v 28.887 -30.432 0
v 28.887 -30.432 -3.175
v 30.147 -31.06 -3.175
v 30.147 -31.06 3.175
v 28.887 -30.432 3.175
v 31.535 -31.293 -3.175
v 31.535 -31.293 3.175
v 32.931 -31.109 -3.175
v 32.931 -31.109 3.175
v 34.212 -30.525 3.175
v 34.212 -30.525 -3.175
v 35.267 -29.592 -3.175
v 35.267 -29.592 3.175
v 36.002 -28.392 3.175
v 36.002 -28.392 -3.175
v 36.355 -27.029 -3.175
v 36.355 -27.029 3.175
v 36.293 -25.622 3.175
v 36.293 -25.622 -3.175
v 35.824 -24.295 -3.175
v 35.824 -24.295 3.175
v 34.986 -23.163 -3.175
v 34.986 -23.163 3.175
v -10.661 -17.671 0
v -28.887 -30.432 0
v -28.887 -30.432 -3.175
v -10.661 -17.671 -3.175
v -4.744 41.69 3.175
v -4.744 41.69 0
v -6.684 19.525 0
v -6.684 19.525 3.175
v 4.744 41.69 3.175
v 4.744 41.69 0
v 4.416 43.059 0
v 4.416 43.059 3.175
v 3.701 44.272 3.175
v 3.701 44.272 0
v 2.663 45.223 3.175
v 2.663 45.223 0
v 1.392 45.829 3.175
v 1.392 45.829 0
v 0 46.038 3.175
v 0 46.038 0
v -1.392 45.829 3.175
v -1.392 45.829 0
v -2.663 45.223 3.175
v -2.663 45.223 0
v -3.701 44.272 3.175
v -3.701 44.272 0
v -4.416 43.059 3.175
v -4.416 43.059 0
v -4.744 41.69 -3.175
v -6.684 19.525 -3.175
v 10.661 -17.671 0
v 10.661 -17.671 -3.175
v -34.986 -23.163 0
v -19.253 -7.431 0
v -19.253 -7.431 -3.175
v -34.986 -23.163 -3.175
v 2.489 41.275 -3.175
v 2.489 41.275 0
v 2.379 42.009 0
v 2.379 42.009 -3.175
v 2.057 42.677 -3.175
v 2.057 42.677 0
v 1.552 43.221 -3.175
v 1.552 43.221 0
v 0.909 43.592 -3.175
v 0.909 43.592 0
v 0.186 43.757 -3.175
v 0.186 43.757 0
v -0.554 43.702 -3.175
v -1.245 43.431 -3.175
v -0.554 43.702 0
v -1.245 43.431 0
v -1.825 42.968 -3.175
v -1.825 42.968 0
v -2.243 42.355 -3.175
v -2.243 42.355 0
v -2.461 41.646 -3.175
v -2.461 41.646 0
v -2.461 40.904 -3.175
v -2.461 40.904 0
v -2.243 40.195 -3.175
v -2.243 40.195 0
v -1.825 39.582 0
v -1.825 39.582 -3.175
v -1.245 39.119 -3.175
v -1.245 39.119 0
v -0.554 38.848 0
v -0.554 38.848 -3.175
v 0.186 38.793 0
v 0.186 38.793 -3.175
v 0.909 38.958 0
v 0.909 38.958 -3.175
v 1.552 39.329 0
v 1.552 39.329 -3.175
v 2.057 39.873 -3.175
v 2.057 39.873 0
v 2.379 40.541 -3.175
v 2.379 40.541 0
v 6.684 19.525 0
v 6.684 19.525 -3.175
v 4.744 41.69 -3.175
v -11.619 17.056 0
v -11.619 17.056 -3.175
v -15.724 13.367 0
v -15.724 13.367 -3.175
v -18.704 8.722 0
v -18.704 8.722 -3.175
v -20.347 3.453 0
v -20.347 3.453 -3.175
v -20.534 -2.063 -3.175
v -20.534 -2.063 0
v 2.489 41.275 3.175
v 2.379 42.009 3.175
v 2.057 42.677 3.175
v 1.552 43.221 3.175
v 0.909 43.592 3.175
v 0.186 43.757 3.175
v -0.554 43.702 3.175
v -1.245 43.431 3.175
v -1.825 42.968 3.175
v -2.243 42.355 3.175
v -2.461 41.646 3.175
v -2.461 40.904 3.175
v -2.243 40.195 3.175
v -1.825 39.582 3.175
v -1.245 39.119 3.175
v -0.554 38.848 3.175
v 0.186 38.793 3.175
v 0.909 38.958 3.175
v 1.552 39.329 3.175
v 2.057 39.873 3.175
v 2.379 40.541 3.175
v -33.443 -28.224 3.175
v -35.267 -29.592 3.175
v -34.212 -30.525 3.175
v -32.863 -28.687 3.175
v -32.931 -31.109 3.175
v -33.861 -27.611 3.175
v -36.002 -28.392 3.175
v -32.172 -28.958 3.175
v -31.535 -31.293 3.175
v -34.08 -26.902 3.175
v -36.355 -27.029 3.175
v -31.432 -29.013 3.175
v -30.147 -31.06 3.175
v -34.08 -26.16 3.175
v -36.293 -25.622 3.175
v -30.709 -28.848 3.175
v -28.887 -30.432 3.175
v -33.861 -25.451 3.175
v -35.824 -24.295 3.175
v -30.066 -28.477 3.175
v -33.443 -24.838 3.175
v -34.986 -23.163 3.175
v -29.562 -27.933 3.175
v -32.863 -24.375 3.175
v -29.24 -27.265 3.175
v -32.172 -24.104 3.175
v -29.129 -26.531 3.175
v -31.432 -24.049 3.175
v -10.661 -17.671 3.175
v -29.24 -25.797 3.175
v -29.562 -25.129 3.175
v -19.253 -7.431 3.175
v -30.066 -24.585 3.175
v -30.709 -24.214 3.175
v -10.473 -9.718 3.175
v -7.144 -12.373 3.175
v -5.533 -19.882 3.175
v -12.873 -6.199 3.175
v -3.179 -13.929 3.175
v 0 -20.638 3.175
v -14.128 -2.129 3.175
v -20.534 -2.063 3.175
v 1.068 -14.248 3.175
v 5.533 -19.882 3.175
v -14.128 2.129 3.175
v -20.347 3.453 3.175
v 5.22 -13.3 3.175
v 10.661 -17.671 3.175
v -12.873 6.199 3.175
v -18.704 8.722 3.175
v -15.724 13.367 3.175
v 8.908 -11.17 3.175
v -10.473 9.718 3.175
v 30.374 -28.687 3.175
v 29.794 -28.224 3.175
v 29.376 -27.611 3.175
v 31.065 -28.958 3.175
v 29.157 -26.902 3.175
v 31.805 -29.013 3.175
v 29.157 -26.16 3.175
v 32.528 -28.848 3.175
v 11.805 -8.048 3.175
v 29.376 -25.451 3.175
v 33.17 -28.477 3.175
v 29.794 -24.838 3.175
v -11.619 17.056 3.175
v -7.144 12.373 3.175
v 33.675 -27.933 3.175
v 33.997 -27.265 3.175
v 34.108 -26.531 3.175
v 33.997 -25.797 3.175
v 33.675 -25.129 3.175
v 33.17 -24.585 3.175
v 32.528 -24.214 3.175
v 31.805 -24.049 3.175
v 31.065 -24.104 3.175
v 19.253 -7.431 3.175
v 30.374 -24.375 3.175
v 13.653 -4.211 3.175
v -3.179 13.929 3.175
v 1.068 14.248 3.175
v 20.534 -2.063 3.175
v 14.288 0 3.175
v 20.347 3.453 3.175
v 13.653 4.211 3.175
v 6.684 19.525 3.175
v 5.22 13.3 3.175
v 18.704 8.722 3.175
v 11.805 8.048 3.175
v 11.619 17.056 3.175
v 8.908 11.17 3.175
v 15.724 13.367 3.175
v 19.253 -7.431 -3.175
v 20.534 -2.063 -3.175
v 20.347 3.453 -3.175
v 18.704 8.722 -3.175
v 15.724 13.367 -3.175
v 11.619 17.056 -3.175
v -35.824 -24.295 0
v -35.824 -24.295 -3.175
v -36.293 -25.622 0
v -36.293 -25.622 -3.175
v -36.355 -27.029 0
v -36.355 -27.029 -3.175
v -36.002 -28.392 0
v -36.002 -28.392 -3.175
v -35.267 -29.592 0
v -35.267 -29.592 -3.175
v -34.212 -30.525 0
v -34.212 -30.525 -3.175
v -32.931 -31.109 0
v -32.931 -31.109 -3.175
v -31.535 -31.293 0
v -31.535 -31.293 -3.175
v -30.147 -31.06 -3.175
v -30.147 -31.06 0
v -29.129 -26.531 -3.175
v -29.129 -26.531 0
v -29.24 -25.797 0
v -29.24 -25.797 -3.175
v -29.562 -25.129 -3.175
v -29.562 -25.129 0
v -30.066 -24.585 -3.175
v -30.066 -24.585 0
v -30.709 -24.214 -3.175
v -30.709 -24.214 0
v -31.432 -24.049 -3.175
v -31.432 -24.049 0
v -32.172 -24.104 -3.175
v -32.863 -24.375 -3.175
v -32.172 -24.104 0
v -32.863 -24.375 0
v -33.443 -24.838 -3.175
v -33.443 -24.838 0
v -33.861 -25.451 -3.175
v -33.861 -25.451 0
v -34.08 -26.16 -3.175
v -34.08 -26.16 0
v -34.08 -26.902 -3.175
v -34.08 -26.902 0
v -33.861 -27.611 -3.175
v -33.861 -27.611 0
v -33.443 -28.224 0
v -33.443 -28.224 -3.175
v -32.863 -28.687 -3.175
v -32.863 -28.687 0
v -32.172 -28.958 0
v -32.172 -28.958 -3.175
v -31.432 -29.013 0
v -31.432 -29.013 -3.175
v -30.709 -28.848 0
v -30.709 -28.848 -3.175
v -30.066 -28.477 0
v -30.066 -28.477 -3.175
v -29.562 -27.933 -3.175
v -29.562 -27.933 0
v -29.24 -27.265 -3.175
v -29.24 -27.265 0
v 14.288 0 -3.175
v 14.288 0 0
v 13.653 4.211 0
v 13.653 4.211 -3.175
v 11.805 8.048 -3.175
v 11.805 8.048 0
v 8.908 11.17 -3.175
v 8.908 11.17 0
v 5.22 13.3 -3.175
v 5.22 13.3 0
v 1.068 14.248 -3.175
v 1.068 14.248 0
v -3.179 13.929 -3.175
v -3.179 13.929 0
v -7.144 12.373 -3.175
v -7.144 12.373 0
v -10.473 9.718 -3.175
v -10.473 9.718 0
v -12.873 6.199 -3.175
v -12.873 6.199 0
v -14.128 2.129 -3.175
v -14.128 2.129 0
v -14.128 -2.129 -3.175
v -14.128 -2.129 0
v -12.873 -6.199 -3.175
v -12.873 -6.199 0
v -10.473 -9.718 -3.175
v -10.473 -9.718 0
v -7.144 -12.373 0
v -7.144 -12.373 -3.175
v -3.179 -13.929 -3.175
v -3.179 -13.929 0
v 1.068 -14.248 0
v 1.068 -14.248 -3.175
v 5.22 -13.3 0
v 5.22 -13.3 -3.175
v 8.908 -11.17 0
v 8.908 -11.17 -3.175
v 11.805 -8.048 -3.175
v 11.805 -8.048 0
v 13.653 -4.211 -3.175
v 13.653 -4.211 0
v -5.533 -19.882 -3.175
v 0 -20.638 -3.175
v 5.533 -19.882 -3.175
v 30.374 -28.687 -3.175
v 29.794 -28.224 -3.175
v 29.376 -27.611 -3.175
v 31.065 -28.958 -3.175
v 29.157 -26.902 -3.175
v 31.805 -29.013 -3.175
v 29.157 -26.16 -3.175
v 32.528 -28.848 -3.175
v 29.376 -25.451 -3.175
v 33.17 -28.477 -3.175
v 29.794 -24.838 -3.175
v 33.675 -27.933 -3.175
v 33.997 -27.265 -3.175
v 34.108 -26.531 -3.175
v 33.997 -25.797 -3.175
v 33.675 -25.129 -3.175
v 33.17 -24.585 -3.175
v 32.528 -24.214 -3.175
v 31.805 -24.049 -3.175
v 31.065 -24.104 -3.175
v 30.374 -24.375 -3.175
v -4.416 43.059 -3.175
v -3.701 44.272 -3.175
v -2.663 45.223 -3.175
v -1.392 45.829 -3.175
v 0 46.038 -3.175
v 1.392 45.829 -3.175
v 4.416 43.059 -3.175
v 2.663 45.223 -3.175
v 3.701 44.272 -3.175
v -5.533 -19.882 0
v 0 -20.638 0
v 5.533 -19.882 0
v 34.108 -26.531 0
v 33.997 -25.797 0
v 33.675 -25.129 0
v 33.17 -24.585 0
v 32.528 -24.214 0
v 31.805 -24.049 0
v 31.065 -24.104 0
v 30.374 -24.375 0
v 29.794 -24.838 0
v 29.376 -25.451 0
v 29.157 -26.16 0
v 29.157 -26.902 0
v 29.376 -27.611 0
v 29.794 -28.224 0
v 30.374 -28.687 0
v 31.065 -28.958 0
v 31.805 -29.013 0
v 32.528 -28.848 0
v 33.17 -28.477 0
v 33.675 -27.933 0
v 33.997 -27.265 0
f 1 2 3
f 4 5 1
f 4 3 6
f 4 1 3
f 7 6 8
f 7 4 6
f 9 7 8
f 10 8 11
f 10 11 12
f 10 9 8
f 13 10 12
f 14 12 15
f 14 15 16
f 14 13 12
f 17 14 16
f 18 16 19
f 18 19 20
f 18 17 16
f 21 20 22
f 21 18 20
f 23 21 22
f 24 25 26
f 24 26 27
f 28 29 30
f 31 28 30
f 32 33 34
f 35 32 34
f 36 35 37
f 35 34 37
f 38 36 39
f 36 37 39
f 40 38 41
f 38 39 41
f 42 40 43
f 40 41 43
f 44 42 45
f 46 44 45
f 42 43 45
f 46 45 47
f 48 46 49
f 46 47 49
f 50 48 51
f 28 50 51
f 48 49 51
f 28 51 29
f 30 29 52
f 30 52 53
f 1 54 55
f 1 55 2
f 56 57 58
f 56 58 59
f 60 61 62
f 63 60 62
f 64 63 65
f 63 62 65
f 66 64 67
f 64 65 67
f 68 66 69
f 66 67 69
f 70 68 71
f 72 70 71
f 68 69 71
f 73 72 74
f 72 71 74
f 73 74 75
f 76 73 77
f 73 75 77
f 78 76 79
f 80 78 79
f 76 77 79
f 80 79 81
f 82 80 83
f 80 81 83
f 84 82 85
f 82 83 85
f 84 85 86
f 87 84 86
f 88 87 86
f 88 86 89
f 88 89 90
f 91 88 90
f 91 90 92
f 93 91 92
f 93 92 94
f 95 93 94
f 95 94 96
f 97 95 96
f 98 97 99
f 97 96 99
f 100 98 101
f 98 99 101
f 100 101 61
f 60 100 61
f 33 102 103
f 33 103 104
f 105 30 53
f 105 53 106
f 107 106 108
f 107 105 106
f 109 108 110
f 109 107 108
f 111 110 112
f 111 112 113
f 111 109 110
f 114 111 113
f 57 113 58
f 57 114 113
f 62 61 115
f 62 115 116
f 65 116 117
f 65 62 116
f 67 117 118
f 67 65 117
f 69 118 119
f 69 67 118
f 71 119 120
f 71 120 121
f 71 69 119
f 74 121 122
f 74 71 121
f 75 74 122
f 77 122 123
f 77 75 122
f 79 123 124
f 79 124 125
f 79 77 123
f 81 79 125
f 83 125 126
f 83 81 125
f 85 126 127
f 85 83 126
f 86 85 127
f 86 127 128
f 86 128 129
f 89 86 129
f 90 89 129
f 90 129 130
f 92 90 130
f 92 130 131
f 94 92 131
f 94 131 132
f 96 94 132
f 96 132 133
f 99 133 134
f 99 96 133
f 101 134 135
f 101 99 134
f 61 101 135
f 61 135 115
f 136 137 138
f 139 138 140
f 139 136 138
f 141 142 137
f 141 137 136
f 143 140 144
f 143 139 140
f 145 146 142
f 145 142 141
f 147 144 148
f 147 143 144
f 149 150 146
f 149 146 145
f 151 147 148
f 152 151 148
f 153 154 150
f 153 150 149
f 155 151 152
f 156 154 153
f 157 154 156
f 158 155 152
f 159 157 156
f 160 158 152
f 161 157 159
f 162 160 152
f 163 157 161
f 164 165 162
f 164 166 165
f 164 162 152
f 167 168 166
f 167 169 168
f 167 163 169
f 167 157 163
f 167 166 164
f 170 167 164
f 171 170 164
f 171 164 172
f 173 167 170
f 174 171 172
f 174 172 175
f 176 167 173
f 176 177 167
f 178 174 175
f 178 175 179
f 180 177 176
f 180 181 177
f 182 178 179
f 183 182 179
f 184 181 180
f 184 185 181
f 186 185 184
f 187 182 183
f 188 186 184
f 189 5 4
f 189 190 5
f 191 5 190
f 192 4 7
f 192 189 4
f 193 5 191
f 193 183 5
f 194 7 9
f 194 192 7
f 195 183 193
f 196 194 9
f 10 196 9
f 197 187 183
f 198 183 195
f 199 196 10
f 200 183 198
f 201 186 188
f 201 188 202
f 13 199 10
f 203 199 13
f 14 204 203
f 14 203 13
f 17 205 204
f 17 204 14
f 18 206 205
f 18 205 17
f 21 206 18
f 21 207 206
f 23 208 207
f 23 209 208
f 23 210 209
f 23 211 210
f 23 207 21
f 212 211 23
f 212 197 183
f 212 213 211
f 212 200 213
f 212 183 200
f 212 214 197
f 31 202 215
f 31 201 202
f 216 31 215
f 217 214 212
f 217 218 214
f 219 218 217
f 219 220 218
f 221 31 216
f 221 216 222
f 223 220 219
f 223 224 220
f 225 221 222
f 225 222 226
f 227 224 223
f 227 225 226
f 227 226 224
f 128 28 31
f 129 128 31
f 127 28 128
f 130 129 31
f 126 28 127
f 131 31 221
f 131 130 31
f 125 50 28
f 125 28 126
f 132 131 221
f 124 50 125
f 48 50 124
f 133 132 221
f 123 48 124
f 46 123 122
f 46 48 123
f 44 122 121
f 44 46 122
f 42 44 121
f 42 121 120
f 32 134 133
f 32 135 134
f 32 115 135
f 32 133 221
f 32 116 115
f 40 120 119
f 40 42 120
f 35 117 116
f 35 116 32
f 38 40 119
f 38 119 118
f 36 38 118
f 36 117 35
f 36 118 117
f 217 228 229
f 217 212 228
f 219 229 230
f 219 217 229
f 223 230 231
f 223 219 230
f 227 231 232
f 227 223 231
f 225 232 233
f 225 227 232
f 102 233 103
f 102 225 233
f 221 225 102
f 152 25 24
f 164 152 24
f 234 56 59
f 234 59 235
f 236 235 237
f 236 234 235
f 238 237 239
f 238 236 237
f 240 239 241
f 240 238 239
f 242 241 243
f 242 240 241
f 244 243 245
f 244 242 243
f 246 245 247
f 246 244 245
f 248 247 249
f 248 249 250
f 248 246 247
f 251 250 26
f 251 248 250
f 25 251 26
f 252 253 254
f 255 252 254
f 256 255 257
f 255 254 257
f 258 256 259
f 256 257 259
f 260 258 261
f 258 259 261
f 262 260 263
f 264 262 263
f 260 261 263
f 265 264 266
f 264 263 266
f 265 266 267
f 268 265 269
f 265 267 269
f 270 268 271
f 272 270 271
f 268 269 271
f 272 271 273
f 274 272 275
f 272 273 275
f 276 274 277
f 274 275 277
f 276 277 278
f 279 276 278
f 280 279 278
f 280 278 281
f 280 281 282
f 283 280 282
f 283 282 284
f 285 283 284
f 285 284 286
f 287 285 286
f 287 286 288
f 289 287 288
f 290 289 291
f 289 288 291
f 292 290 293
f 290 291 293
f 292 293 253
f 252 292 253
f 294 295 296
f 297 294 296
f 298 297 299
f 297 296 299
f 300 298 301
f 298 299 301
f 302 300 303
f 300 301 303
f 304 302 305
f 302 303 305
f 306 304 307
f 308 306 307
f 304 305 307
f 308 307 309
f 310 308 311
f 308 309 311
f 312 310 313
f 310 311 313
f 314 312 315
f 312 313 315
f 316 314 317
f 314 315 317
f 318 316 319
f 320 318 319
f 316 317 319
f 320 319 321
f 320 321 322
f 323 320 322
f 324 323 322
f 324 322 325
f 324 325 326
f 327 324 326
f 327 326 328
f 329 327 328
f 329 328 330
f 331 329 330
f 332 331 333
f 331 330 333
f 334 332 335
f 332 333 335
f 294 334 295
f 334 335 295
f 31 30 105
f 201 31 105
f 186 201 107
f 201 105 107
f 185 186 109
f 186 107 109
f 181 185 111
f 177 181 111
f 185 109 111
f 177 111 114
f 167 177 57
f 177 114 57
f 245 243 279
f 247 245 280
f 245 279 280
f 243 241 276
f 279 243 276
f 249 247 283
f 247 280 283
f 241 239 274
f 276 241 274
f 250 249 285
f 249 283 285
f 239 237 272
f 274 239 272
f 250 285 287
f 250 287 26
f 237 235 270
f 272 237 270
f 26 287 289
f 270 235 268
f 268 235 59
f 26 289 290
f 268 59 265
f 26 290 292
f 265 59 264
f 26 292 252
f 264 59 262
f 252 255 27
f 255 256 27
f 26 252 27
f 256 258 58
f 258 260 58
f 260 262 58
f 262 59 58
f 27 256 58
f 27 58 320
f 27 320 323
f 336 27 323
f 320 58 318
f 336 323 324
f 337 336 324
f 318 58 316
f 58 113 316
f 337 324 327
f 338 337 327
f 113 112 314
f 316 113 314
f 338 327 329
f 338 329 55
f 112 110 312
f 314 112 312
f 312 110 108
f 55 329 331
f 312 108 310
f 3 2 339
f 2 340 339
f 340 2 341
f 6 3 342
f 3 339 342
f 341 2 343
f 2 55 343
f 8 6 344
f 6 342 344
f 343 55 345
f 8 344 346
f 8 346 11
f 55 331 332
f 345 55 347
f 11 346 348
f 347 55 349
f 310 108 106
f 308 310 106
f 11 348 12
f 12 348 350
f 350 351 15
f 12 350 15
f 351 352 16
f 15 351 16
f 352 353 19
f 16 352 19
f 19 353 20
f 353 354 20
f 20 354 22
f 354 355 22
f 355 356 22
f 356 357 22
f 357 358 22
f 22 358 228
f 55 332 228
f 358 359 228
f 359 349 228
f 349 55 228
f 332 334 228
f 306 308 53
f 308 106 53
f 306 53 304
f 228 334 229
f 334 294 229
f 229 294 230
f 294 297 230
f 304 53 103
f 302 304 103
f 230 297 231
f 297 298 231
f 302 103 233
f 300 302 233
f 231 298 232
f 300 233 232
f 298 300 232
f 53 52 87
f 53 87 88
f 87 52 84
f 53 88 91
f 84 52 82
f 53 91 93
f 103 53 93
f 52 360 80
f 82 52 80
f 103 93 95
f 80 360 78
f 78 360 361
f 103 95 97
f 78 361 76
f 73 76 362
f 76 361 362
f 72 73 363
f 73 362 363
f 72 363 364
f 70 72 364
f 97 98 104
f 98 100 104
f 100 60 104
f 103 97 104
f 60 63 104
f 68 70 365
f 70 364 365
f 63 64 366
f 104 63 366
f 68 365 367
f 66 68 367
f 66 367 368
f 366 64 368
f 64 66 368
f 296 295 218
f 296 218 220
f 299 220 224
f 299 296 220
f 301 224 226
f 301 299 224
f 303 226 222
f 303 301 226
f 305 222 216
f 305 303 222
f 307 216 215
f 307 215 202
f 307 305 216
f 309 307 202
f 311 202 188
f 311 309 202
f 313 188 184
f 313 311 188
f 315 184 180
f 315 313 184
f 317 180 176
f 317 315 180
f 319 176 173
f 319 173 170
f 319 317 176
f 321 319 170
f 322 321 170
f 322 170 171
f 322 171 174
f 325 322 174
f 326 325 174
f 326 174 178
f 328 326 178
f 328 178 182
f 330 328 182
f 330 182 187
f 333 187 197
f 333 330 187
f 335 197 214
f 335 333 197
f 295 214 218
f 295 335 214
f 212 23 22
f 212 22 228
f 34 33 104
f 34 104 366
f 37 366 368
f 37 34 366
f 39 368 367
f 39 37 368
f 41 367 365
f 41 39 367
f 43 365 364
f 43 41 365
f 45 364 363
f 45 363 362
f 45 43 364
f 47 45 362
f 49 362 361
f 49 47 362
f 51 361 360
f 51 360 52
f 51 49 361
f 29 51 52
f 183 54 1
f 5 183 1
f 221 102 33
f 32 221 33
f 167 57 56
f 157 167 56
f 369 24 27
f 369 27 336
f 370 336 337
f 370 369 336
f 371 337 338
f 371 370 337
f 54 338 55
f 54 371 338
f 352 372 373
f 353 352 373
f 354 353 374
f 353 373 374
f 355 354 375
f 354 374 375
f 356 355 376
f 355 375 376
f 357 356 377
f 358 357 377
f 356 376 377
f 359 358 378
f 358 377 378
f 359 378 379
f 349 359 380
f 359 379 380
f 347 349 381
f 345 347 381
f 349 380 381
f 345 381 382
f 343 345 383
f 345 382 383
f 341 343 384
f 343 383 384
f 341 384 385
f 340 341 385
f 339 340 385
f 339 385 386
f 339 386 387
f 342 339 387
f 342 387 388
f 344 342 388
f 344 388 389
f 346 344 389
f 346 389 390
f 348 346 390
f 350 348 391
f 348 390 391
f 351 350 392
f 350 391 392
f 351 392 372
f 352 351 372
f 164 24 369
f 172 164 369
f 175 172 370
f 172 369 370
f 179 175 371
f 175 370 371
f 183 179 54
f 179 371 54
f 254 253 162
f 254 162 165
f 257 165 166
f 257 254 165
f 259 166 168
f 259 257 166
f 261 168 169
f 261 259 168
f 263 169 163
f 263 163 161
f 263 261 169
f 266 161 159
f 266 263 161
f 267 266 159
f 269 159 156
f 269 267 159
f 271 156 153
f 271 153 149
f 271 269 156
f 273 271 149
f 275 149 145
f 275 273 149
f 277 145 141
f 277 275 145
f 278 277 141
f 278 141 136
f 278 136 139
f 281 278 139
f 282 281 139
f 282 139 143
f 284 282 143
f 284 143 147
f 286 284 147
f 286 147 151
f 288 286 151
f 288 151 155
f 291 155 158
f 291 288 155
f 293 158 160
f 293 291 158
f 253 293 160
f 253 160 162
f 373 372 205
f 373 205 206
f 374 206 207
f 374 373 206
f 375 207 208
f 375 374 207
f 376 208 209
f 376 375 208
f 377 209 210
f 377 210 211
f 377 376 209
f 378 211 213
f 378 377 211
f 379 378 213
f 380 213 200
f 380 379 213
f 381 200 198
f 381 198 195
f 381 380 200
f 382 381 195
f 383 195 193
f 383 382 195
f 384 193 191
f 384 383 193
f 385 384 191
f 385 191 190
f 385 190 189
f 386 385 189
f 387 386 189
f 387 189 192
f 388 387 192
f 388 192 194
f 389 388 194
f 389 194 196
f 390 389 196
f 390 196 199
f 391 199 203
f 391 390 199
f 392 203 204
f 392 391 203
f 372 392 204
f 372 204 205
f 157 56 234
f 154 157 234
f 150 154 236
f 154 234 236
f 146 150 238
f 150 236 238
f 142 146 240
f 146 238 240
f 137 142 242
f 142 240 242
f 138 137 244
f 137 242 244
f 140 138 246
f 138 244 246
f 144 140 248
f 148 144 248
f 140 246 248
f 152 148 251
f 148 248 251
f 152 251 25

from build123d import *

# Parameters (mm, degrees)
SKETCH1_R           = 20.6375
SKETCH1_R_2         = 14.2875
SKETCH1_R_3         = 4.7625
SKETCH1_R_4         = 2.4892
BOSS_EXTRUDE1_DEPTH = 3.175


with BuildPart() as part:
    # Sketch1 → Boss-Extrude1 (new, symmetric)
    # profile 1 of 7: a face of its own
    with BuildSketch(Plane.XY):
        Circle(SKETCH1_R)
        Circle(SKETCH1_R_2, mode=Mode.SUBTRACT)
    # profile 2 of 7: a face of its own
    with BuildSketch(Plane.XY):
        with BuildLine():
            ThreePointArc((4.7625, 41.275), (-0.207737332, 36.517032845), (-4.74437725, 41.690079225))
            Line((-4.74437725, 41.690079225), (-6.68354577, 19.525281616))
            ThreePointArc((-6.68354577, 19.525281616), (0, 20.6375), (6.68354577, 19.525281616))
            Line((6.68354577, 19.525281616), (4.74437725, 41.690079225))
            ThreePointArc((4.74437725, 41.690079225), (4.757967155, 41.482737332), (4.7625, 41.275))
        make_face()
    # profile 3 of 7: a face of its own
    with BuildSketch(Plane.XY):
        with BuildLine():
            Line((34.986080435, -23.163462544), (19.253333892, -7.430716001))
            ThreePointArc((19.253333892, -7.430716001), (15.809242195, -13.265529295), (10.661133073, -17.670502196))
            Line((10.661133073, -17.670502196), (28.886826612, -30.432270201))
            ThreePointArc((28.886826612, -30.432270201), (27.970197729, -23.469782599), (34.986080435, -23.163462544))
        make_face()
    # profile 4 of 7: a face of its own
    with BuildSketch(Plane.XY):
        with BuildLine():
            ThreePointArc((-10.661133073, -17.670502196), (-15.809242195, -13.265529295), (-19.253333892, -7.430716001))
            Line((-19.253333892, -7.430716001), (-34.986080435, -23.163462544))
            ThreePointArc((-34.986080435, -23.163462544), (-29.795954543, -22.131082316), (-26.85598439, -26.53105859))
            ThreePointArc((-26.85598439, -26.53105859), (-27.394095297, -28.73013636), (-28.886826612, -30.432270201))
            Line((-28.886826612, -30.432270201), (-10.661133073, -17.670502196))
        make_face()
    # profile 5 of 7: a face of its own
    with BuildSketch(Plane.XY):
        with Locations((-31.61848439, -26.53105859)):
            Circle(SKETCH1_R_3)
        with Locations((-31.61848439, -26.53105859)):
            Circle(SKETCH1_R_4, mode=Mode.SUBTRACT)
    # profile 6 of 7: a face of its own
    with BuildSketch(Plane.XY):
        with Locations((0, 41.275)):
            Circle(SKETCH1_R_3)
        with Locations((0, 41.275)):
            Circle(SKETCH1_R_4, mode=Mode.SUBTRACT)
    # profile 7 of 7: a face of its own
    with BuildSketch(Plane.XY):
        with Locations((31.61848439, -26.53105859)):
            Circle(SKETCH1_R_3)
        with Locations((31.61848439, -26.53105859)):
            Circle(SKETCH1_R_4, mode=Mode.SUBTRACT)
    extrude(amount=BOSS_EXTRUDE1_DEPTH, both=True)


solid = part.part
